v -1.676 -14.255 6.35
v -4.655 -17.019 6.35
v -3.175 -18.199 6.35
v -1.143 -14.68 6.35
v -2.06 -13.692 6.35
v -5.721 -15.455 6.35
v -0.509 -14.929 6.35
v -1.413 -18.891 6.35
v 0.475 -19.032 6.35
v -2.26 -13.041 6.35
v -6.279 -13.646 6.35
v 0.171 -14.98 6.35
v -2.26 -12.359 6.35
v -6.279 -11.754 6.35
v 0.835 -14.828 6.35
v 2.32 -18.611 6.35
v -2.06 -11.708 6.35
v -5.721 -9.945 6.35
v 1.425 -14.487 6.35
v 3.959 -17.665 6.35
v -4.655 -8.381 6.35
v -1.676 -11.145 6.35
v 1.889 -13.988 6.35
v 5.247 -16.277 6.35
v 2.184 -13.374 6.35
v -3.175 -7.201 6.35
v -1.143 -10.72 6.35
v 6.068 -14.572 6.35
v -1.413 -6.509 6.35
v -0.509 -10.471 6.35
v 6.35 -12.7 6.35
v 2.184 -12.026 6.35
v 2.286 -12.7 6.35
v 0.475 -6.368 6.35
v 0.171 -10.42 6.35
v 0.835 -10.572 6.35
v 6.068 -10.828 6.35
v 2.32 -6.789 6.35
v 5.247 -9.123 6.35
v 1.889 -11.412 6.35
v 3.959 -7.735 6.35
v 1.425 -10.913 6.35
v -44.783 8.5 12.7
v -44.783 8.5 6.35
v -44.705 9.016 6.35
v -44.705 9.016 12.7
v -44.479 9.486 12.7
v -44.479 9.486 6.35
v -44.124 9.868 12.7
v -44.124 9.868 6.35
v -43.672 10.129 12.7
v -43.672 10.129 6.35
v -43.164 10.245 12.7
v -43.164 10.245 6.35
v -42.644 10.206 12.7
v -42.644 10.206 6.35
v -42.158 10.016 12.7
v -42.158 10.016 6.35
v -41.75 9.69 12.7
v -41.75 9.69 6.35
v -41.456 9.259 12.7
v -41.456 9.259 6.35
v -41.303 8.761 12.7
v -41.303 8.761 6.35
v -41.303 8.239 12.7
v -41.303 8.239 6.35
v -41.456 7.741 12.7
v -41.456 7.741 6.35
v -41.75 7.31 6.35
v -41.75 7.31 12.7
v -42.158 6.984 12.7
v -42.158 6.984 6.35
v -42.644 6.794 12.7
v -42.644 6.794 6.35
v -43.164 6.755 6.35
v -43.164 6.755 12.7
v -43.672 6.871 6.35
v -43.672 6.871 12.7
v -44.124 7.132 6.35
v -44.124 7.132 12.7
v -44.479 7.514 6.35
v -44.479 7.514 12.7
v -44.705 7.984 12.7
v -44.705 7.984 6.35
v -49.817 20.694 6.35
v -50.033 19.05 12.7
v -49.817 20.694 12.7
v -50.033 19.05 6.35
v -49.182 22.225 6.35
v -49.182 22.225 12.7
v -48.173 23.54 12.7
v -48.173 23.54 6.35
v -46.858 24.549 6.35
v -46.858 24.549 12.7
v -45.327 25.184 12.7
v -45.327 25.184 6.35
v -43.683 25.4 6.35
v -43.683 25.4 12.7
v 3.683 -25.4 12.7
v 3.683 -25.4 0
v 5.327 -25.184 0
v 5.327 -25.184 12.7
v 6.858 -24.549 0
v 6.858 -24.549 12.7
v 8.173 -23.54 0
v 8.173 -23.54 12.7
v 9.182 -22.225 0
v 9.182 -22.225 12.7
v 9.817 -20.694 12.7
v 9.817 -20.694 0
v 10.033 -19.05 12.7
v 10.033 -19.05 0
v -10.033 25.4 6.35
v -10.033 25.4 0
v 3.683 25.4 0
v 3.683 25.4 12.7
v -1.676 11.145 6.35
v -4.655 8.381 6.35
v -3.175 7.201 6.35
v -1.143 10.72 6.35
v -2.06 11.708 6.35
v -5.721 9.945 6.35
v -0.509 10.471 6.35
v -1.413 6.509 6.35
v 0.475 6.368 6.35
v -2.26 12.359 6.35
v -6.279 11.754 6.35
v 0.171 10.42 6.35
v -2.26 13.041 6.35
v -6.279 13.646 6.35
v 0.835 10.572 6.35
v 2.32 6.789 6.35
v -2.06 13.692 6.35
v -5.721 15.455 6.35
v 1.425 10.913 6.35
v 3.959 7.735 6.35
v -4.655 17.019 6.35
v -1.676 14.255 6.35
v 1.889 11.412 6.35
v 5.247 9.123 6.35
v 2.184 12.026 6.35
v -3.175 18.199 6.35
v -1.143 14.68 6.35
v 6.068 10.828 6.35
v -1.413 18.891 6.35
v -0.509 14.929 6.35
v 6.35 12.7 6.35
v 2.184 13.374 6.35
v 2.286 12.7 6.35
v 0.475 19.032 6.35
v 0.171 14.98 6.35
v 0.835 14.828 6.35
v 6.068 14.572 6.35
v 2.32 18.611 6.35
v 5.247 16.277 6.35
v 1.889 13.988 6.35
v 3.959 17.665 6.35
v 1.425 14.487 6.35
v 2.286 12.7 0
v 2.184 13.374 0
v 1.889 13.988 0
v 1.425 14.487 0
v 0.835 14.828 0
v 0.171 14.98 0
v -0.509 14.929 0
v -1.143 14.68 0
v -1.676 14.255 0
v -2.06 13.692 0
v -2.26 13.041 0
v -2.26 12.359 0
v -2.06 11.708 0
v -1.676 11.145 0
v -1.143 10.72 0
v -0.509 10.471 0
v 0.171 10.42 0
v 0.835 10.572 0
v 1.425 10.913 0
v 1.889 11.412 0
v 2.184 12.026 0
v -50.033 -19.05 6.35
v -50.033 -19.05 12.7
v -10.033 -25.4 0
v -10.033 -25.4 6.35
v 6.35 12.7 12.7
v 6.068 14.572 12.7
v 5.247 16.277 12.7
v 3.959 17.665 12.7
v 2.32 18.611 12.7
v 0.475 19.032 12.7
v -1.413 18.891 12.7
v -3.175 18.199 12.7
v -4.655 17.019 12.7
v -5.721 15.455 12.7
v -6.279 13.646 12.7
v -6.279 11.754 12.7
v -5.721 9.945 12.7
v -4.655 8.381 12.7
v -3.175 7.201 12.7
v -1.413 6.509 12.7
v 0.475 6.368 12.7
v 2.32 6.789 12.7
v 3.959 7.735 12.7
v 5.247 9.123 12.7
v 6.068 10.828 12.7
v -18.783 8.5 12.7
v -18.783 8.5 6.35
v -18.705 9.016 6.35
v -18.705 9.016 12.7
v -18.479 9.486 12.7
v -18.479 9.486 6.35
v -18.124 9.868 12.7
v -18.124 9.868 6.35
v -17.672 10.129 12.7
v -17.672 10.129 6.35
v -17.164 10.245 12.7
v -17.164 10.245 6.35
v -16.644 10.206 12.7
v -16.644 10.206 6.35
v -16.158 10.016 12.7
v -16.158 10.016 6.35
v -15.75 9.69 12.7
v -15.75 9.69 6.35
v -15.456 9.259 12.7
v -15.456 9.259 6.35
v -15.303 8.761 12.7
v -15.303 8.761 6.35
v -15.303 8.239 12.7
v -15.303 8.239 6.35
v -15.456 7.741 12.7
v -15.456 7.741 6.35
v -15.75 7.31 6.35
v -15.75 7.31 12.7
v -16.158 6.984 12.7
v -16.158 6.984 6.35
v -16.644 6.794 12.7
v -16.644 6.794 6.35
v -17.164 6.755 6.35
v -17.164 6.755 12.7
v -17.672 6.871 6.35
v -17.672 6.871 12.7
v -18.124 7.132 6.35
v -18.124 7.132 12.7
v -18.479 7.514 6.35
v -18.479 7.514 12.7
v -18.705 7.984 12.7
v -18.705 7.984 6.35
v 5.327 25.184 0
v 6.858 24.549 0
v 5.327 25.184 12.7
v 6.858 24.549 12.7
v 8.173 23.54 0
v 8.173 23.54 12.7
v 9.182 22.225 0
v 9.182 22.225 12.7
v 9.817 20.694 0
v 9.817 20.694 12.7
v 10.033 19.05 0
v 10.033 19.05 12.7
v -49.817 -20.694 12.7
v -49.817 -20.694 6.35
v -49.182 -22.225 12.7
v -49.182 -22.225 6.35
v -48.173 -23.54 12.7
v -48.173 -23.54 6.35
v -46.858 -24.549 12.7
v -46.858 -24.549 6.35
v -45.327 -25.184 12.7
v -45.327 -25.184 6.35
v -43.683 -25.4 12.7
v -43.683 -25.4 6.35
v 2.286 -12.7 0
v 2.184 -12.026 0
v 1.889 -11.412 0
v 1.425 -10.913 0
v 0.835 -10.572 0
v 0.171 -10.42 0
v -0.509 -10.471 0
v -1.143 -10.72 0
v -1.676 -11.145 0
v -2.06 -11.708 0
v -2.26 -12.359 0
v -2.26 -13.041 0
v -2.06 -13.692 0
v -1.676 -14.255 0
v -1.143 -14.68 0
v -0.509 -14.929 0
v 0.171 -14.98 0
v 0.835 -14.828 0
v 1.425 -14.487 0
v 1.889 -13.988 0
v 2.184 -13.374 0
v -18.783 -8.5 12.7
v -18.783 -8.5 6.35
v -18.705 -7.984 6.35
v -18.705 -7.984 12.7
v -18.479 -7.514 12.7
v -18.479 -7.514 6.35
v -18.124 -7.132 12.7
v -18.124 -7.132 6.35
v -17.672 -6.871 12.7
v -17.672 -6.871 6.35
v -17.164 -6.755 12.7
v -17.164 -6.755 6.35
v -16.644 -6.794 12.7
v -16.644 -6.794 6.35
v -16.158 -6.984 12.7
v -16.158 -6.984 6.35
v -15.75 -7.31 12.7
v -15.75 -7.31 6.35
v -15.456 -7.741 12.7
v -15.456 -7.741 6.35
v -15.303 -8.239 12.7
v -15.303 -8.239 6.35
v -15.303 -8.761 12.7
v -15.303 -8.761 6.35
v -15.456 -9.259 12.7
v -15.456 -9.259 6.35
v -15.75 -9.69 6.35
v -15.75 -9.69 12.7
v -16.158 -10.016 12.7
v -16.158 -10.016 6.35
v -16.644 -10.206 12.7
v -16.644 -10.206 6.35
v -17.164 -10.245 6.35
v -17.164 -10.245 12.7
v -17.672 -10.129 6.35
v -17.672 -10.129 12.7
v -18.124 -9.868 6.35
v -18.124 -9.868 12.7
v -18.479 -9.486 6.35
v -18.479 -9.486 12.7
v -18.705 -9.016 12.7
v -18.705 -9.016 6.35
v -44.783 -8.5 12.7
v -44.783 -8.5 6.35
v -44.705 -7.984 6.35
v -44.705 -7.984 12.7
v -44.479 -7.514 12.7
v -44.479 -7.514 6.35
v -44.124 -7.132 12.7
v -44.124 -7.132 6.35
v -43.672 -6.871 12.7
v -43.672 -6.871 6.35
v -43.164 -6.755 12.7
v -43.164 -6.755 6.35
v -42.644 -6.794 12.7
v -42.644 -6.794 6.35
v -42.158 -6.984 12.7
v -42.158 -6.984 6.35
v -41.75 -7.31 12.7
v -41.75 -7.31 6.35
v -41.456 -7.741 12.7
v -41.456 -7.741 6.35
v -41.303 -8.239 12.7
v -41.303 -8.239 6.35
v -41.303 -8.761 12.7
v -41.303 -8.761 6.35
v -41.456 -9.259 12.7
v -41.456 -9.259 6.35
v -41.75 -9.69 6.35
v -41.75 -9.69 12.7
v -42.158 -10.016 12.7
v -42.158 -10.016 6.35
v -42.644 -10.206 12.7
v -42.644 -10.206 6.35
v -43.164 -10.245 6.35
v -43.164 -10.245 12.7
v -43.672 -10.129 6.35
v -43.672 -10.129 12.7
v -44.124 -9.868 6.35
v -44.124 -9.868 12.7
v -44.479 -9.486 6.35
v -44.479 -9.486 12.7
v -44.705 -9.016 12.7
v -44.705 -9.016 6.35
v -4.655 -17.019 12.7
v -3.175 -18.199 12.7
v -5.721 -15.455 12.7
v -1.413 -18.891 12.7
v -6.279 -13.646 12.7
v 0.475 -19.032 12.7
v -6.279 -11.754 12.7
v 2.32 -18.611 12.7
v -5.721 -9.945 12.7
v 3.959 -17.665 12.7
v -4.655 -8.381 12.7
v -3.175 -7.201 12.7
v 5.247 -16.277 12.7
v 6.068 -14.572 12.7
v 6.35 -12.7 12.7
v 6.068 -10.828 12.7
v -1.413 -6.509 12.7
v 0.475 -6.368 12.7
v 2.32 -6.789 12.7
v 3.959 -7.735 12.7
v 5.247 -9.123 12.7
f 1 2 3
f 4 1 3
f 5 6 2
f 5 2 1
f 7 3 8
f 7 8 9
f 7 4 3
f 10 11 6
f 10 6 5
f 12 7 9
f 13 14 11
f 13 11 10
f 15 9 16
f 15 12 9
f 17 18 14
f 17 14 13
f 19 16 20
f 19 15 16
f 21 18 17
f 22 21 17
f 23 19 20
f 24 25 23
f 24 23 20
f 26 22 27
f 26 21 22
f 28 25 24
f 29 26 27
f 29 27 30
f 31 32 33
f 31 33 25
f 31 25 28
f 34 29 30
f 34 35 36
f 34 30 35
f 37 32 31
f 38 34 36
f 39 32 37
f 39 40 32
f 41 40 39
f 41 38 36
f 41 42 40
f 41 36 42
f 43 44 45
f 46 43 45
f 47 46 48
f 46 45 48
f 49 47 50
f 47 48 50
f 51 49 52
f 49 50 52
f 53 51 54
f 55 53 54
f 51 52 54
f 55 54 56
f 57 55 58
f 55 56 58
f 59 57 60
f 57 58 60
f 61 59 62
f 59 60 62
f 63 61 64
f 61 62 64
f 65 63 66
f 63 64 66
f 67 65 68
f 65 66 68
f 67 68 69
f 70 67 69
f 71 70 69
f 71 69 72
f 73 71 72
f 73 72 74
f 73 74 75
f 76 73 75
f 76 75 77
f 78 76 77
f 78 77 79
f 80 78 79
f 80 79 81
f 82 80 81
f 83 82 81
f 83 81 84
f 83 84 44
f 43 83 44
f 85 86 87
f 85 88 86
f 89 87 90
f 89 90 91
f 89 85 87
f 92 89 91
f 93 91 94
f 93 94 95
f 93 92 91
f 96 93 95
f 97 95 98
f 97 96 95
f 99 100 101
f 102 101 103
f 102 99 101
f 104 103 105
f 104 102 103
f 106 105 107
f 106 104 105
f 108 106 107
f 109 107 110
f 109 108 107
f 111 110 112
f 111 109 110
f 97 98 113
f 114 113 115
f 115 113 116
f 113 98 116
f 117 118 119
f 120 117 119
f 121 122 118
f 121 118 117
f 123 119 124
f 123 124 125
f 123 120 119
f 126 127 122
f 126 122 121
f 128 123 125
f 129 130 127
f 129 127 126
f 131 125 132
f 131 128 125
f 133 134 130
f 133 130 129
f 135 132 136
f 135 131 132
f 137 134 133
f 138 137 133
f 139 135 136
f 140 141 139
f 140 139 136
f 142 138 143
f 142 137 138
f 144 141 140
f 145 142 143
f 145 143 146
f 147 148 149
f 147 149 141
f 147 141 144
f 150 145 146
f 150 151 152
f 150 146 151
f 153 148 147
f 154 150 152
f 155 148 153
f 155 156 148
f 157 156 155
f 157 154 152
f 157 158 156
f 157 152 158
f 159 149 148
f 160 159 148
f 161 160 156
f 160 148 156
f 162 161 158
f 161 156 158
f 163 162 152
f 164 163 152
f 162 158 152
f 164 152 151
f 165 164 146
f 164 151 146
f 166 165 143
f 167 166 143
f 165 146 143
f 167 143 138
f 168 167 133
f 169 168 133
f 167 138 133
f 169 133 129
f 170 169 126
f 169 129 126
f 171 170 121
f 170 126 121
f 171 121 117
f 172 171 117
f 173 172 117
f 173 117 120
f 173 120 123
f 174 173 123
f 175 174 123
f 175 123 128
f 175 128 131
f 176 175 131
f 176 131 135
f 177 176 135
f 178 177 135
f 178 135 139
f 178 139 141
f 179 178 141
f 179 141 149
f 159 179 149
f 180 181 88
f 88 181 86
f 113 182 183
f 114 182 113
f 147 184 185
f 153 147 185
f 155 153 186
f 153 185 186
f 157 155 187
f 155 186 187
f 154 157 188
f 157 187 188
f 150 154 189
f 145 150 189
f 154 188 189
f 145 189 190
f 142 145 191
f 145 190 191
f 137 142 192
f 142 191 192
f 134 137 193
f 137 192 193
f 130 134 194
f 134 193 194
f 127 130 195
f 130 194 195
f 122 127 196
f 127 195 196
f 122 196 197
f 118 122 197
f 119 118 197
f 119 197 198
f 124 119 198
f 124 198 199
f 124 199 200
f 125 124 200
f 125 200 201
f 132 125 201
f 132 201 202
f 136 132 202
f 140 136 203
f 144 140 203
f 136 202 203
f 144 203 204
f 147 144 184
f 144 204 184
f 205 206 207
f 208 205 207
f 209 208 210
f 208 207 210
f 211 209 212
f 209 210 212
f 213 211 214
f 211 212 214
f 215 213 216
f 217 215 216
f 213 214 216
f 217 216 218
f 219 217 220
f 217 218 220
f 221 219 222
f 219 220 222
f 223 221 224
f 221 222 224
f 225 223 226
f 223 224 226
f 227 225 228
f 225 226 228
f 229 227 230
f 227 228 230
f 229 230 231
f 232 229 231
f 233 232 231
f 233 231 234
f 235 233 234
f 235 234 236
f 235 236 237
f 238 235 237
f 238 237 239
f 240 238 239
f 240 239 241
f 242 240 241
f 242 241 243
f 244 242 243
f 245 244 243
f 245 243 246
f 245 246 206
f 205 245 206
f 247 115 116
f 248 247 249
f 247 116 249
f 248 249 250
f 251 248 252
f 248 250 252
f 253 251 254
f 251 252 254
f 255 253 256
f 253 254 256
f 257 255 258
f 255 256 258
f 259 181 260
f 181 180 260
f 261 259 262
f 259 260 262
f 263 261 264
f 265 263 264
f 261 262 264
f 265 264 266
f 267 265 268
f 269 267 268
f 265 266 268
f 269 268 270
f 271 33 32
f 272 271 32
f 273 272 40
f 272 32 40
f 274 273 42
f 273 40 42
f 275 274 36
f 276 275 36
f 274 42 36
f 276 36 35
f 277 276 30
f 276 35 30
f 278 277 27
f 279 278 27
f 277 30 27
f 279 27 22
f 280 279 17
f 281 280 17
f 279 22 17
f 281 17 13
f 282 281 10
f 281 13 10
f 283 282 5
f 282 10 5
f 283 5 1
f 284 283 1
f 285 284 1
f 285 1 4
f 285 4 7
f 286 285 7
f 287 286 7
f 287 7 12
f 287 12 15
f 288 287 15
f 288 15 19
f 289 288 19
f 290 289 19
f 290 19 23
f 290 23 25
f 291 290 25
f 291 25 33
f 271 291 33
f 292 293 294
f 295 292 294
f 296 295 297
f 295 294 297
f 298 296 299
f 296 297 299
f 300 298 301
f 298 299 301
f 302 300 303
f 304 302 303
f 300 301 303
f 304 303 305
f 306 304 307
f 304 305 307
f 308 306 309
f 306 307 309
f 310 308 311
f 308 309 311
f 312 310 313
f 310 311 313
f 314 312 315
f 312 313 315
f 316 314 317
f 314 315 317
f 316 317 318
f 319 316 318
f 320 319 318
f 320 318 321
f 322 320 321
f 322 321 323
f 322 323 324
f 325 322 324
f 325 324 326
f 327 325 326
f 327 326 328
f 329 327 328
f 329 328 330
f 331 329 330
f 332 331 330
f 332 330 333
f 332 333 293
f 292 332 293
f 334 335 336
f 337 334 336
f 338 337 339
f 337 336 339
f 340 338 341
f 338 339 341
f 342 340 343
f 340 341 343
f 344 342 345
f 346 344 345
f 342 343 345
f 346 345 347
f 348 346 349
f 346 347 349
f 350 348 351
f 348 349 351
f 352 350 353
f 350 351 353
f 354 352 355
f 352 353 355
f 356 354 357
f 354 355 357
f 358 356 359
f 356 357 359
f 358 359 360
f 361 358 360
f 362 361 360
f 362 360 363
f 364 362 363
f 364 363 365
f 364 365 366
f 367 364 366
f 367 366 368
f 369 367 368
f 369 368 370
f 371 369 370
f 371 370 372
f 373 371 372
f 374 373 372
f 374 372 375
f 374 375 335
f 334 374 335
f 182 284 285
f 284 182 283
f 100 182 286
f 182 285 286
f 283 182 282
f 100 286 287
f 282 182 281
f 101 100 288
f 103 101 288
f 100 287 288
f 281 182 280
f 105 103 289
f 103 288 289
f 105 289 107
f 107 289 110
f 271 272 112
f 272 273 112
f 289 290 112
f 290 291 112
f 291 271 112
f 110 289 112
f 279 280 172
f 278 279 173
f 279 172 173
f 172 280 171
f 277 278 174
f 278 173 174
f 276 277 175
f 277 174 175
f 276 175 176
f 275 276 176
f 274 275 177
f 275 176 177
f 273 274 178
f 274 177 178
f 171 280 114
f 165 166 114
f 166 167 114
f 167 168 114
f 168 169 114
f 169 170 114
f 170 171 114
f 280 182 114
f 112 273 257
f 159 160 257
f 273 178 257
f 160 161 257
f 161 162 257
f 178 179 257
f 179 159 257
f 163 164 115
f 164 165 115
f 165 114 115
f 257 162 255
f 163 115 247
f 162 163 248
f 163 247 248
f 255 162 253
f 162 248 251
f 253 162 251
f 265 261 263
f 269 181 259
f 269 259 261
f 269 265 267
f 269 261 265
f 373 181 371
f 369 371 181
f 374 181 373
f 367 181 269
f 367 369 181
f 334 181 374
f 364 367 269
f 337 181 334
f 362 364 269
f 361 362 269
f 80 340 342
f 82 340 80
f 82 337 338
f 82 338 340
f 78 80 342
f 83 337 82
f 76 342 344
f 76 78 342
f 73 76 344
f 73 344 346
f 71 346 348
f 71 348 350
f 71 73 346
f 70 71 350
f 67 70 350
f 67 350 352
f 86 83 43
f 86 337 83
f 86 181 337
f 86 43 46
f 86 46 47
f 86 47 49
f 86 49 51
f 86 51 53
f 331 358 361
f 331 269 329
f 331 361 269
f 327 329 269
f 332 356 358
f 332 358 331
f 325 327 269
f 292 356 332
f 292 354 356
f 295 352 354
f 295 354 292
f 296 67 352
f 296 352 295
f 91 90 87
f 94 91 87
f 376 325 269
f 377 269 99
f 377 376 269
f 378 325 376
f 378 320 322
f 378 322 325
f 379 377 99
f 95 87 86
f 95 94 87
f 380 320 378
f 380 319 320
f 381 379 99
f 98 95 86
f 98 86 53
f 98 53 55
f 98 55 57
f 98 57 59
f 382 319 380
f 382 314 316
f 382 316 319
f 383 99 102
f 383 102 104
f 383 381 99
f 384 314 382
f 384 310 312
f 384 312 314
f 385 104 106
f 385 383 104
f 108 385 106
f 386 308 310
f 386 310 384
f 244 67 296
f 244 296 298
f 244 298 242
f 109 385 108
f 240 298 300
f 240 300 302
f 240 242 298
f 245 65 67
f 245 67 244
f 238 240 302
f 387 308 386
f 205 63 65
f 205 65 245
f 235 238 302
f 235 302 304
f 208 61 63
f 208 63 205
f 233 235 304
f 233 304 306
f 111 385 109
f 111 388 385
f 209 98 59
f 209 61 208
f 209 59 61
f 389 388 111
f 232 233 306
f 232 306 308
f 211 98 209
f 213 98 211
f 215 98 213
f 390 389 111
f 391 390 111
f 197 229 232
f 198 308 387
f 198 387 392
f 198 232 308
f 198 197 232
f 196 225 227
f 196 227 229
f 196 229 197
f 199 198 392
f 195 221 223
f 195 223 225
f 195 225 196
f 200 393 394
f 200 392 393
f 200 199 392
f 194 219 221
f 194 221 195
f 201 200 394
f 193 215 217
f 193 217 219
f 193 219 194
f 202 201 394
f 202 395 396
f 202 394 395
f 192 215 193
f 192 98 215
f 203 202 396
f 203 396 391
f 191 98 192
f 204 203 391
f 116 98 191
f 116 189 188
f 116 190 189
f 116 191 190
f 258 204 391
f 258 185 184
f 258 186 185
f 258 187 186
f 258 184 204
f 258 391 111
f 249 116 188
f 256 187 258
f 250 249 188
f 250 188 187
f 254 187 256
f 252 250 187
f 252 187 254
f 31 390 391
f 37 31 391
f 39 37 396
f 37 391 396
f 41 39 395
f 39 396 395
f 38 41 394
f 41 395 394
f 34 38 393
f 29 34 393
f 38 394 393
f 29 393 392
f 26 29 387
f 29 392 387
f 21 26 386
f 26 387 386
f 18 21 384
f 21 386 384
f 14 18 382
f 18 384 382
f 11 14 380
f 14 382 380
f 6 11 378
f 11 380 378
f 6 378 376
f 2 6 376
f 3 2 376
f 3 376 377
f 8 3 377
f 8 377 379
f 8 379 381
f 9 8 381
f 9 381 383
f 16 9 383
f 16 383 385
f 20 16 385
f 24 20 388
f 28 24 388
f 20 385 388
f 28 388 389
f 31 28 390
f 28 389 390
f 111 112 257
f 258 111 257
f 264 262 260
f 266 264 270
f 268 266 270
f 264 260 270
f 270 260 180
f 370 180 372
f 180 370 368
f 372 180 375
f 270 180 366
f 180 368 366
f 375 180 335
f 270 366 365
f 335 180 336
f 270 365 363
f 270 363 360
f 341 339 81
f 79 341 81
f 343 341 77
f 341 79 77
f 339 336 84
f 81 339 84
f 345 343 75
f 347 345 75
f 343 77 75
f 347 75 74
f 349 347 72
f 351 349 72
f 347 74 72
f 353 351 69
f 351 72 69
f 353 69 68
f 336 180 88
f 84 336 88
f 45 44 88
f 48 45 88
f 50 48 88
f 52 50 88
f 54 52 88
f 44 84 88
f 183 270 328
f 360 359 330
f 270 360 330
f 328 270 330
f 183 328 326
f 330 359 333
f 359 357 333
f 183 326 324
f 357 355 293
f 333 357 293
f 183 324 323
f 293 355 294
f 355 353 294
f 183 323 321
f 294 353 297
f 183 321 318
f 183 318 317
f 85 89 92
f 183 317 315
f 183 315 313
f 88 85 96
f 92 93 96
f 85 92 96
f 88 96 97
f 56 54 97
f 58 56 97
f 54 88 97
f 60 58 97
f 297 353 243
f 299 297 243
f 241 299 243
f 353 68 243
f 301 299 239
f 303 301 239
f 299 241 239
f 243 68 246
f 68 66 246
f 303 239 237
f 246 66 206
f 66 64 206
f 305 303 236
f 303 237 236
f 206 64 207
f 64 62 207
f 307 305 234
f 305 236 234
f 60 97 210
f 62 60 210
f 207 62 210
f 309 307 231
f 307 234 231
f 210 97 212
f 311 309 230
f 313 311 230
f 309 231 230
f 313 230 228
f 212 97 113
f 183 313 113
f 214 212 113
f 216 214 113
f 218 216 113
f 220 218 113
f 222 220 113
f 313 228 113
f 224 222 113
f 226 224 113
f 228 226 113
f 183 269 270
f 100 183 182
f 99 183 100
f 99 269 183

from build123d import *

# Parameters (mm, degrees)
SKETCH1_W           = 20.066
SKETCH1_H           = 50.8
BOSS_EXTRUDE1_DEPTH = 12.7
SKETCH2_R           = 2.286
CUT_EXTRUDE1_DEPTH  = 13.7
SKETCH3_W           = 40
SKETCH3_H           = 50.8
BOSS_EXTRUDE2_DEPTH = 6.35
SKETCH5_R           = 1.75
CUT_EXTRUDE2_DEPTH  = 7.35
SKETCH6_R           = 6.35
CUT_EXTRUDE3_DEPTH  = 6.35
FILLET1_R           = 6.35


with BuildPart() as part:
    # Sketch1 → Boss-Extrude1 (new body)
    with BuildSketch(Plane.XY):
        Rectangle(SKETCH1_W, SKETCH1_H)
    extrude(amount=BOSS_EXTRUDE1_DEPTH)

    # Sketch2 → Cut-Extrude1 (cut, through all)
    with BuildSketch(Plane.XY.offset(12.7)):
        with Locations((0, 12.7)):
            Circle(SKETCH2_R)
        with Locations((0, -12.7)):
            Circle(SKETCH2_R)
    extrude(amount=-CUT_EXTRUDE1_DEPTH, mode=Mode.SUBTRACT)

    # Sketch3 → Boss-Extrude2 (add)
    with BuildSketch(Plane.XY.offset(12.7)):
        with Locations((-30.033, 0)):
            Rectangle(SKETCH3_W, SKETCH3_H)
    extrude(amount=-BOSS_EXTRUDE2_DEPTH)

    # Sketch5 → Cut-Extrude2 (cut, through all)
    with BuildSketch(Plane(origin=(0, 0, 6.35), x_dir=(-1, 0, 0), z_dir=(0, 0, -1))):
        with Locations((43.033, 8.5)):
            Circle(SKETCH5_R)
        with Locations((17.033, 8.5)):
            Circle(SKETCH5_R)
        with Locations((43.033, -8.5)):
            Circle(SKETCH5_R)
        with Locations((17.033, -8.5)):
            Circle(SKETCH5_R)
    extrude(amount=-CUT_EXTRUDE2_DEPTH, mode=Mode.SUBTRACT)

    # Sketch6 → Cut-Extrude3 (cut)
    with BuildSketch(Plane.XY.offset(12.7)):
        with Locations((0, 12.7)):
            Circle(SKETCH6_R)
        with Locations((0, -12.7)):
            Circle(SKETCH6_R)
    extrude(amount=-CUT_EXTRUDE3_DEPTH, mode=Mode.SUBTRACT)

    # Fillet1
    fillet1_edges = [part.edges().sort_by_distance(p)[0] for p in [
        (-50.033, -25.4, 9.525),
        (-50.033, 25.4, 9.525),
        (10.033, -25.4, 6.35),
        (10.033, 25.4, 6.35),
    ]]
    fillet(fillet1_edges, radius=FILLET1_R)


solid = part.part
